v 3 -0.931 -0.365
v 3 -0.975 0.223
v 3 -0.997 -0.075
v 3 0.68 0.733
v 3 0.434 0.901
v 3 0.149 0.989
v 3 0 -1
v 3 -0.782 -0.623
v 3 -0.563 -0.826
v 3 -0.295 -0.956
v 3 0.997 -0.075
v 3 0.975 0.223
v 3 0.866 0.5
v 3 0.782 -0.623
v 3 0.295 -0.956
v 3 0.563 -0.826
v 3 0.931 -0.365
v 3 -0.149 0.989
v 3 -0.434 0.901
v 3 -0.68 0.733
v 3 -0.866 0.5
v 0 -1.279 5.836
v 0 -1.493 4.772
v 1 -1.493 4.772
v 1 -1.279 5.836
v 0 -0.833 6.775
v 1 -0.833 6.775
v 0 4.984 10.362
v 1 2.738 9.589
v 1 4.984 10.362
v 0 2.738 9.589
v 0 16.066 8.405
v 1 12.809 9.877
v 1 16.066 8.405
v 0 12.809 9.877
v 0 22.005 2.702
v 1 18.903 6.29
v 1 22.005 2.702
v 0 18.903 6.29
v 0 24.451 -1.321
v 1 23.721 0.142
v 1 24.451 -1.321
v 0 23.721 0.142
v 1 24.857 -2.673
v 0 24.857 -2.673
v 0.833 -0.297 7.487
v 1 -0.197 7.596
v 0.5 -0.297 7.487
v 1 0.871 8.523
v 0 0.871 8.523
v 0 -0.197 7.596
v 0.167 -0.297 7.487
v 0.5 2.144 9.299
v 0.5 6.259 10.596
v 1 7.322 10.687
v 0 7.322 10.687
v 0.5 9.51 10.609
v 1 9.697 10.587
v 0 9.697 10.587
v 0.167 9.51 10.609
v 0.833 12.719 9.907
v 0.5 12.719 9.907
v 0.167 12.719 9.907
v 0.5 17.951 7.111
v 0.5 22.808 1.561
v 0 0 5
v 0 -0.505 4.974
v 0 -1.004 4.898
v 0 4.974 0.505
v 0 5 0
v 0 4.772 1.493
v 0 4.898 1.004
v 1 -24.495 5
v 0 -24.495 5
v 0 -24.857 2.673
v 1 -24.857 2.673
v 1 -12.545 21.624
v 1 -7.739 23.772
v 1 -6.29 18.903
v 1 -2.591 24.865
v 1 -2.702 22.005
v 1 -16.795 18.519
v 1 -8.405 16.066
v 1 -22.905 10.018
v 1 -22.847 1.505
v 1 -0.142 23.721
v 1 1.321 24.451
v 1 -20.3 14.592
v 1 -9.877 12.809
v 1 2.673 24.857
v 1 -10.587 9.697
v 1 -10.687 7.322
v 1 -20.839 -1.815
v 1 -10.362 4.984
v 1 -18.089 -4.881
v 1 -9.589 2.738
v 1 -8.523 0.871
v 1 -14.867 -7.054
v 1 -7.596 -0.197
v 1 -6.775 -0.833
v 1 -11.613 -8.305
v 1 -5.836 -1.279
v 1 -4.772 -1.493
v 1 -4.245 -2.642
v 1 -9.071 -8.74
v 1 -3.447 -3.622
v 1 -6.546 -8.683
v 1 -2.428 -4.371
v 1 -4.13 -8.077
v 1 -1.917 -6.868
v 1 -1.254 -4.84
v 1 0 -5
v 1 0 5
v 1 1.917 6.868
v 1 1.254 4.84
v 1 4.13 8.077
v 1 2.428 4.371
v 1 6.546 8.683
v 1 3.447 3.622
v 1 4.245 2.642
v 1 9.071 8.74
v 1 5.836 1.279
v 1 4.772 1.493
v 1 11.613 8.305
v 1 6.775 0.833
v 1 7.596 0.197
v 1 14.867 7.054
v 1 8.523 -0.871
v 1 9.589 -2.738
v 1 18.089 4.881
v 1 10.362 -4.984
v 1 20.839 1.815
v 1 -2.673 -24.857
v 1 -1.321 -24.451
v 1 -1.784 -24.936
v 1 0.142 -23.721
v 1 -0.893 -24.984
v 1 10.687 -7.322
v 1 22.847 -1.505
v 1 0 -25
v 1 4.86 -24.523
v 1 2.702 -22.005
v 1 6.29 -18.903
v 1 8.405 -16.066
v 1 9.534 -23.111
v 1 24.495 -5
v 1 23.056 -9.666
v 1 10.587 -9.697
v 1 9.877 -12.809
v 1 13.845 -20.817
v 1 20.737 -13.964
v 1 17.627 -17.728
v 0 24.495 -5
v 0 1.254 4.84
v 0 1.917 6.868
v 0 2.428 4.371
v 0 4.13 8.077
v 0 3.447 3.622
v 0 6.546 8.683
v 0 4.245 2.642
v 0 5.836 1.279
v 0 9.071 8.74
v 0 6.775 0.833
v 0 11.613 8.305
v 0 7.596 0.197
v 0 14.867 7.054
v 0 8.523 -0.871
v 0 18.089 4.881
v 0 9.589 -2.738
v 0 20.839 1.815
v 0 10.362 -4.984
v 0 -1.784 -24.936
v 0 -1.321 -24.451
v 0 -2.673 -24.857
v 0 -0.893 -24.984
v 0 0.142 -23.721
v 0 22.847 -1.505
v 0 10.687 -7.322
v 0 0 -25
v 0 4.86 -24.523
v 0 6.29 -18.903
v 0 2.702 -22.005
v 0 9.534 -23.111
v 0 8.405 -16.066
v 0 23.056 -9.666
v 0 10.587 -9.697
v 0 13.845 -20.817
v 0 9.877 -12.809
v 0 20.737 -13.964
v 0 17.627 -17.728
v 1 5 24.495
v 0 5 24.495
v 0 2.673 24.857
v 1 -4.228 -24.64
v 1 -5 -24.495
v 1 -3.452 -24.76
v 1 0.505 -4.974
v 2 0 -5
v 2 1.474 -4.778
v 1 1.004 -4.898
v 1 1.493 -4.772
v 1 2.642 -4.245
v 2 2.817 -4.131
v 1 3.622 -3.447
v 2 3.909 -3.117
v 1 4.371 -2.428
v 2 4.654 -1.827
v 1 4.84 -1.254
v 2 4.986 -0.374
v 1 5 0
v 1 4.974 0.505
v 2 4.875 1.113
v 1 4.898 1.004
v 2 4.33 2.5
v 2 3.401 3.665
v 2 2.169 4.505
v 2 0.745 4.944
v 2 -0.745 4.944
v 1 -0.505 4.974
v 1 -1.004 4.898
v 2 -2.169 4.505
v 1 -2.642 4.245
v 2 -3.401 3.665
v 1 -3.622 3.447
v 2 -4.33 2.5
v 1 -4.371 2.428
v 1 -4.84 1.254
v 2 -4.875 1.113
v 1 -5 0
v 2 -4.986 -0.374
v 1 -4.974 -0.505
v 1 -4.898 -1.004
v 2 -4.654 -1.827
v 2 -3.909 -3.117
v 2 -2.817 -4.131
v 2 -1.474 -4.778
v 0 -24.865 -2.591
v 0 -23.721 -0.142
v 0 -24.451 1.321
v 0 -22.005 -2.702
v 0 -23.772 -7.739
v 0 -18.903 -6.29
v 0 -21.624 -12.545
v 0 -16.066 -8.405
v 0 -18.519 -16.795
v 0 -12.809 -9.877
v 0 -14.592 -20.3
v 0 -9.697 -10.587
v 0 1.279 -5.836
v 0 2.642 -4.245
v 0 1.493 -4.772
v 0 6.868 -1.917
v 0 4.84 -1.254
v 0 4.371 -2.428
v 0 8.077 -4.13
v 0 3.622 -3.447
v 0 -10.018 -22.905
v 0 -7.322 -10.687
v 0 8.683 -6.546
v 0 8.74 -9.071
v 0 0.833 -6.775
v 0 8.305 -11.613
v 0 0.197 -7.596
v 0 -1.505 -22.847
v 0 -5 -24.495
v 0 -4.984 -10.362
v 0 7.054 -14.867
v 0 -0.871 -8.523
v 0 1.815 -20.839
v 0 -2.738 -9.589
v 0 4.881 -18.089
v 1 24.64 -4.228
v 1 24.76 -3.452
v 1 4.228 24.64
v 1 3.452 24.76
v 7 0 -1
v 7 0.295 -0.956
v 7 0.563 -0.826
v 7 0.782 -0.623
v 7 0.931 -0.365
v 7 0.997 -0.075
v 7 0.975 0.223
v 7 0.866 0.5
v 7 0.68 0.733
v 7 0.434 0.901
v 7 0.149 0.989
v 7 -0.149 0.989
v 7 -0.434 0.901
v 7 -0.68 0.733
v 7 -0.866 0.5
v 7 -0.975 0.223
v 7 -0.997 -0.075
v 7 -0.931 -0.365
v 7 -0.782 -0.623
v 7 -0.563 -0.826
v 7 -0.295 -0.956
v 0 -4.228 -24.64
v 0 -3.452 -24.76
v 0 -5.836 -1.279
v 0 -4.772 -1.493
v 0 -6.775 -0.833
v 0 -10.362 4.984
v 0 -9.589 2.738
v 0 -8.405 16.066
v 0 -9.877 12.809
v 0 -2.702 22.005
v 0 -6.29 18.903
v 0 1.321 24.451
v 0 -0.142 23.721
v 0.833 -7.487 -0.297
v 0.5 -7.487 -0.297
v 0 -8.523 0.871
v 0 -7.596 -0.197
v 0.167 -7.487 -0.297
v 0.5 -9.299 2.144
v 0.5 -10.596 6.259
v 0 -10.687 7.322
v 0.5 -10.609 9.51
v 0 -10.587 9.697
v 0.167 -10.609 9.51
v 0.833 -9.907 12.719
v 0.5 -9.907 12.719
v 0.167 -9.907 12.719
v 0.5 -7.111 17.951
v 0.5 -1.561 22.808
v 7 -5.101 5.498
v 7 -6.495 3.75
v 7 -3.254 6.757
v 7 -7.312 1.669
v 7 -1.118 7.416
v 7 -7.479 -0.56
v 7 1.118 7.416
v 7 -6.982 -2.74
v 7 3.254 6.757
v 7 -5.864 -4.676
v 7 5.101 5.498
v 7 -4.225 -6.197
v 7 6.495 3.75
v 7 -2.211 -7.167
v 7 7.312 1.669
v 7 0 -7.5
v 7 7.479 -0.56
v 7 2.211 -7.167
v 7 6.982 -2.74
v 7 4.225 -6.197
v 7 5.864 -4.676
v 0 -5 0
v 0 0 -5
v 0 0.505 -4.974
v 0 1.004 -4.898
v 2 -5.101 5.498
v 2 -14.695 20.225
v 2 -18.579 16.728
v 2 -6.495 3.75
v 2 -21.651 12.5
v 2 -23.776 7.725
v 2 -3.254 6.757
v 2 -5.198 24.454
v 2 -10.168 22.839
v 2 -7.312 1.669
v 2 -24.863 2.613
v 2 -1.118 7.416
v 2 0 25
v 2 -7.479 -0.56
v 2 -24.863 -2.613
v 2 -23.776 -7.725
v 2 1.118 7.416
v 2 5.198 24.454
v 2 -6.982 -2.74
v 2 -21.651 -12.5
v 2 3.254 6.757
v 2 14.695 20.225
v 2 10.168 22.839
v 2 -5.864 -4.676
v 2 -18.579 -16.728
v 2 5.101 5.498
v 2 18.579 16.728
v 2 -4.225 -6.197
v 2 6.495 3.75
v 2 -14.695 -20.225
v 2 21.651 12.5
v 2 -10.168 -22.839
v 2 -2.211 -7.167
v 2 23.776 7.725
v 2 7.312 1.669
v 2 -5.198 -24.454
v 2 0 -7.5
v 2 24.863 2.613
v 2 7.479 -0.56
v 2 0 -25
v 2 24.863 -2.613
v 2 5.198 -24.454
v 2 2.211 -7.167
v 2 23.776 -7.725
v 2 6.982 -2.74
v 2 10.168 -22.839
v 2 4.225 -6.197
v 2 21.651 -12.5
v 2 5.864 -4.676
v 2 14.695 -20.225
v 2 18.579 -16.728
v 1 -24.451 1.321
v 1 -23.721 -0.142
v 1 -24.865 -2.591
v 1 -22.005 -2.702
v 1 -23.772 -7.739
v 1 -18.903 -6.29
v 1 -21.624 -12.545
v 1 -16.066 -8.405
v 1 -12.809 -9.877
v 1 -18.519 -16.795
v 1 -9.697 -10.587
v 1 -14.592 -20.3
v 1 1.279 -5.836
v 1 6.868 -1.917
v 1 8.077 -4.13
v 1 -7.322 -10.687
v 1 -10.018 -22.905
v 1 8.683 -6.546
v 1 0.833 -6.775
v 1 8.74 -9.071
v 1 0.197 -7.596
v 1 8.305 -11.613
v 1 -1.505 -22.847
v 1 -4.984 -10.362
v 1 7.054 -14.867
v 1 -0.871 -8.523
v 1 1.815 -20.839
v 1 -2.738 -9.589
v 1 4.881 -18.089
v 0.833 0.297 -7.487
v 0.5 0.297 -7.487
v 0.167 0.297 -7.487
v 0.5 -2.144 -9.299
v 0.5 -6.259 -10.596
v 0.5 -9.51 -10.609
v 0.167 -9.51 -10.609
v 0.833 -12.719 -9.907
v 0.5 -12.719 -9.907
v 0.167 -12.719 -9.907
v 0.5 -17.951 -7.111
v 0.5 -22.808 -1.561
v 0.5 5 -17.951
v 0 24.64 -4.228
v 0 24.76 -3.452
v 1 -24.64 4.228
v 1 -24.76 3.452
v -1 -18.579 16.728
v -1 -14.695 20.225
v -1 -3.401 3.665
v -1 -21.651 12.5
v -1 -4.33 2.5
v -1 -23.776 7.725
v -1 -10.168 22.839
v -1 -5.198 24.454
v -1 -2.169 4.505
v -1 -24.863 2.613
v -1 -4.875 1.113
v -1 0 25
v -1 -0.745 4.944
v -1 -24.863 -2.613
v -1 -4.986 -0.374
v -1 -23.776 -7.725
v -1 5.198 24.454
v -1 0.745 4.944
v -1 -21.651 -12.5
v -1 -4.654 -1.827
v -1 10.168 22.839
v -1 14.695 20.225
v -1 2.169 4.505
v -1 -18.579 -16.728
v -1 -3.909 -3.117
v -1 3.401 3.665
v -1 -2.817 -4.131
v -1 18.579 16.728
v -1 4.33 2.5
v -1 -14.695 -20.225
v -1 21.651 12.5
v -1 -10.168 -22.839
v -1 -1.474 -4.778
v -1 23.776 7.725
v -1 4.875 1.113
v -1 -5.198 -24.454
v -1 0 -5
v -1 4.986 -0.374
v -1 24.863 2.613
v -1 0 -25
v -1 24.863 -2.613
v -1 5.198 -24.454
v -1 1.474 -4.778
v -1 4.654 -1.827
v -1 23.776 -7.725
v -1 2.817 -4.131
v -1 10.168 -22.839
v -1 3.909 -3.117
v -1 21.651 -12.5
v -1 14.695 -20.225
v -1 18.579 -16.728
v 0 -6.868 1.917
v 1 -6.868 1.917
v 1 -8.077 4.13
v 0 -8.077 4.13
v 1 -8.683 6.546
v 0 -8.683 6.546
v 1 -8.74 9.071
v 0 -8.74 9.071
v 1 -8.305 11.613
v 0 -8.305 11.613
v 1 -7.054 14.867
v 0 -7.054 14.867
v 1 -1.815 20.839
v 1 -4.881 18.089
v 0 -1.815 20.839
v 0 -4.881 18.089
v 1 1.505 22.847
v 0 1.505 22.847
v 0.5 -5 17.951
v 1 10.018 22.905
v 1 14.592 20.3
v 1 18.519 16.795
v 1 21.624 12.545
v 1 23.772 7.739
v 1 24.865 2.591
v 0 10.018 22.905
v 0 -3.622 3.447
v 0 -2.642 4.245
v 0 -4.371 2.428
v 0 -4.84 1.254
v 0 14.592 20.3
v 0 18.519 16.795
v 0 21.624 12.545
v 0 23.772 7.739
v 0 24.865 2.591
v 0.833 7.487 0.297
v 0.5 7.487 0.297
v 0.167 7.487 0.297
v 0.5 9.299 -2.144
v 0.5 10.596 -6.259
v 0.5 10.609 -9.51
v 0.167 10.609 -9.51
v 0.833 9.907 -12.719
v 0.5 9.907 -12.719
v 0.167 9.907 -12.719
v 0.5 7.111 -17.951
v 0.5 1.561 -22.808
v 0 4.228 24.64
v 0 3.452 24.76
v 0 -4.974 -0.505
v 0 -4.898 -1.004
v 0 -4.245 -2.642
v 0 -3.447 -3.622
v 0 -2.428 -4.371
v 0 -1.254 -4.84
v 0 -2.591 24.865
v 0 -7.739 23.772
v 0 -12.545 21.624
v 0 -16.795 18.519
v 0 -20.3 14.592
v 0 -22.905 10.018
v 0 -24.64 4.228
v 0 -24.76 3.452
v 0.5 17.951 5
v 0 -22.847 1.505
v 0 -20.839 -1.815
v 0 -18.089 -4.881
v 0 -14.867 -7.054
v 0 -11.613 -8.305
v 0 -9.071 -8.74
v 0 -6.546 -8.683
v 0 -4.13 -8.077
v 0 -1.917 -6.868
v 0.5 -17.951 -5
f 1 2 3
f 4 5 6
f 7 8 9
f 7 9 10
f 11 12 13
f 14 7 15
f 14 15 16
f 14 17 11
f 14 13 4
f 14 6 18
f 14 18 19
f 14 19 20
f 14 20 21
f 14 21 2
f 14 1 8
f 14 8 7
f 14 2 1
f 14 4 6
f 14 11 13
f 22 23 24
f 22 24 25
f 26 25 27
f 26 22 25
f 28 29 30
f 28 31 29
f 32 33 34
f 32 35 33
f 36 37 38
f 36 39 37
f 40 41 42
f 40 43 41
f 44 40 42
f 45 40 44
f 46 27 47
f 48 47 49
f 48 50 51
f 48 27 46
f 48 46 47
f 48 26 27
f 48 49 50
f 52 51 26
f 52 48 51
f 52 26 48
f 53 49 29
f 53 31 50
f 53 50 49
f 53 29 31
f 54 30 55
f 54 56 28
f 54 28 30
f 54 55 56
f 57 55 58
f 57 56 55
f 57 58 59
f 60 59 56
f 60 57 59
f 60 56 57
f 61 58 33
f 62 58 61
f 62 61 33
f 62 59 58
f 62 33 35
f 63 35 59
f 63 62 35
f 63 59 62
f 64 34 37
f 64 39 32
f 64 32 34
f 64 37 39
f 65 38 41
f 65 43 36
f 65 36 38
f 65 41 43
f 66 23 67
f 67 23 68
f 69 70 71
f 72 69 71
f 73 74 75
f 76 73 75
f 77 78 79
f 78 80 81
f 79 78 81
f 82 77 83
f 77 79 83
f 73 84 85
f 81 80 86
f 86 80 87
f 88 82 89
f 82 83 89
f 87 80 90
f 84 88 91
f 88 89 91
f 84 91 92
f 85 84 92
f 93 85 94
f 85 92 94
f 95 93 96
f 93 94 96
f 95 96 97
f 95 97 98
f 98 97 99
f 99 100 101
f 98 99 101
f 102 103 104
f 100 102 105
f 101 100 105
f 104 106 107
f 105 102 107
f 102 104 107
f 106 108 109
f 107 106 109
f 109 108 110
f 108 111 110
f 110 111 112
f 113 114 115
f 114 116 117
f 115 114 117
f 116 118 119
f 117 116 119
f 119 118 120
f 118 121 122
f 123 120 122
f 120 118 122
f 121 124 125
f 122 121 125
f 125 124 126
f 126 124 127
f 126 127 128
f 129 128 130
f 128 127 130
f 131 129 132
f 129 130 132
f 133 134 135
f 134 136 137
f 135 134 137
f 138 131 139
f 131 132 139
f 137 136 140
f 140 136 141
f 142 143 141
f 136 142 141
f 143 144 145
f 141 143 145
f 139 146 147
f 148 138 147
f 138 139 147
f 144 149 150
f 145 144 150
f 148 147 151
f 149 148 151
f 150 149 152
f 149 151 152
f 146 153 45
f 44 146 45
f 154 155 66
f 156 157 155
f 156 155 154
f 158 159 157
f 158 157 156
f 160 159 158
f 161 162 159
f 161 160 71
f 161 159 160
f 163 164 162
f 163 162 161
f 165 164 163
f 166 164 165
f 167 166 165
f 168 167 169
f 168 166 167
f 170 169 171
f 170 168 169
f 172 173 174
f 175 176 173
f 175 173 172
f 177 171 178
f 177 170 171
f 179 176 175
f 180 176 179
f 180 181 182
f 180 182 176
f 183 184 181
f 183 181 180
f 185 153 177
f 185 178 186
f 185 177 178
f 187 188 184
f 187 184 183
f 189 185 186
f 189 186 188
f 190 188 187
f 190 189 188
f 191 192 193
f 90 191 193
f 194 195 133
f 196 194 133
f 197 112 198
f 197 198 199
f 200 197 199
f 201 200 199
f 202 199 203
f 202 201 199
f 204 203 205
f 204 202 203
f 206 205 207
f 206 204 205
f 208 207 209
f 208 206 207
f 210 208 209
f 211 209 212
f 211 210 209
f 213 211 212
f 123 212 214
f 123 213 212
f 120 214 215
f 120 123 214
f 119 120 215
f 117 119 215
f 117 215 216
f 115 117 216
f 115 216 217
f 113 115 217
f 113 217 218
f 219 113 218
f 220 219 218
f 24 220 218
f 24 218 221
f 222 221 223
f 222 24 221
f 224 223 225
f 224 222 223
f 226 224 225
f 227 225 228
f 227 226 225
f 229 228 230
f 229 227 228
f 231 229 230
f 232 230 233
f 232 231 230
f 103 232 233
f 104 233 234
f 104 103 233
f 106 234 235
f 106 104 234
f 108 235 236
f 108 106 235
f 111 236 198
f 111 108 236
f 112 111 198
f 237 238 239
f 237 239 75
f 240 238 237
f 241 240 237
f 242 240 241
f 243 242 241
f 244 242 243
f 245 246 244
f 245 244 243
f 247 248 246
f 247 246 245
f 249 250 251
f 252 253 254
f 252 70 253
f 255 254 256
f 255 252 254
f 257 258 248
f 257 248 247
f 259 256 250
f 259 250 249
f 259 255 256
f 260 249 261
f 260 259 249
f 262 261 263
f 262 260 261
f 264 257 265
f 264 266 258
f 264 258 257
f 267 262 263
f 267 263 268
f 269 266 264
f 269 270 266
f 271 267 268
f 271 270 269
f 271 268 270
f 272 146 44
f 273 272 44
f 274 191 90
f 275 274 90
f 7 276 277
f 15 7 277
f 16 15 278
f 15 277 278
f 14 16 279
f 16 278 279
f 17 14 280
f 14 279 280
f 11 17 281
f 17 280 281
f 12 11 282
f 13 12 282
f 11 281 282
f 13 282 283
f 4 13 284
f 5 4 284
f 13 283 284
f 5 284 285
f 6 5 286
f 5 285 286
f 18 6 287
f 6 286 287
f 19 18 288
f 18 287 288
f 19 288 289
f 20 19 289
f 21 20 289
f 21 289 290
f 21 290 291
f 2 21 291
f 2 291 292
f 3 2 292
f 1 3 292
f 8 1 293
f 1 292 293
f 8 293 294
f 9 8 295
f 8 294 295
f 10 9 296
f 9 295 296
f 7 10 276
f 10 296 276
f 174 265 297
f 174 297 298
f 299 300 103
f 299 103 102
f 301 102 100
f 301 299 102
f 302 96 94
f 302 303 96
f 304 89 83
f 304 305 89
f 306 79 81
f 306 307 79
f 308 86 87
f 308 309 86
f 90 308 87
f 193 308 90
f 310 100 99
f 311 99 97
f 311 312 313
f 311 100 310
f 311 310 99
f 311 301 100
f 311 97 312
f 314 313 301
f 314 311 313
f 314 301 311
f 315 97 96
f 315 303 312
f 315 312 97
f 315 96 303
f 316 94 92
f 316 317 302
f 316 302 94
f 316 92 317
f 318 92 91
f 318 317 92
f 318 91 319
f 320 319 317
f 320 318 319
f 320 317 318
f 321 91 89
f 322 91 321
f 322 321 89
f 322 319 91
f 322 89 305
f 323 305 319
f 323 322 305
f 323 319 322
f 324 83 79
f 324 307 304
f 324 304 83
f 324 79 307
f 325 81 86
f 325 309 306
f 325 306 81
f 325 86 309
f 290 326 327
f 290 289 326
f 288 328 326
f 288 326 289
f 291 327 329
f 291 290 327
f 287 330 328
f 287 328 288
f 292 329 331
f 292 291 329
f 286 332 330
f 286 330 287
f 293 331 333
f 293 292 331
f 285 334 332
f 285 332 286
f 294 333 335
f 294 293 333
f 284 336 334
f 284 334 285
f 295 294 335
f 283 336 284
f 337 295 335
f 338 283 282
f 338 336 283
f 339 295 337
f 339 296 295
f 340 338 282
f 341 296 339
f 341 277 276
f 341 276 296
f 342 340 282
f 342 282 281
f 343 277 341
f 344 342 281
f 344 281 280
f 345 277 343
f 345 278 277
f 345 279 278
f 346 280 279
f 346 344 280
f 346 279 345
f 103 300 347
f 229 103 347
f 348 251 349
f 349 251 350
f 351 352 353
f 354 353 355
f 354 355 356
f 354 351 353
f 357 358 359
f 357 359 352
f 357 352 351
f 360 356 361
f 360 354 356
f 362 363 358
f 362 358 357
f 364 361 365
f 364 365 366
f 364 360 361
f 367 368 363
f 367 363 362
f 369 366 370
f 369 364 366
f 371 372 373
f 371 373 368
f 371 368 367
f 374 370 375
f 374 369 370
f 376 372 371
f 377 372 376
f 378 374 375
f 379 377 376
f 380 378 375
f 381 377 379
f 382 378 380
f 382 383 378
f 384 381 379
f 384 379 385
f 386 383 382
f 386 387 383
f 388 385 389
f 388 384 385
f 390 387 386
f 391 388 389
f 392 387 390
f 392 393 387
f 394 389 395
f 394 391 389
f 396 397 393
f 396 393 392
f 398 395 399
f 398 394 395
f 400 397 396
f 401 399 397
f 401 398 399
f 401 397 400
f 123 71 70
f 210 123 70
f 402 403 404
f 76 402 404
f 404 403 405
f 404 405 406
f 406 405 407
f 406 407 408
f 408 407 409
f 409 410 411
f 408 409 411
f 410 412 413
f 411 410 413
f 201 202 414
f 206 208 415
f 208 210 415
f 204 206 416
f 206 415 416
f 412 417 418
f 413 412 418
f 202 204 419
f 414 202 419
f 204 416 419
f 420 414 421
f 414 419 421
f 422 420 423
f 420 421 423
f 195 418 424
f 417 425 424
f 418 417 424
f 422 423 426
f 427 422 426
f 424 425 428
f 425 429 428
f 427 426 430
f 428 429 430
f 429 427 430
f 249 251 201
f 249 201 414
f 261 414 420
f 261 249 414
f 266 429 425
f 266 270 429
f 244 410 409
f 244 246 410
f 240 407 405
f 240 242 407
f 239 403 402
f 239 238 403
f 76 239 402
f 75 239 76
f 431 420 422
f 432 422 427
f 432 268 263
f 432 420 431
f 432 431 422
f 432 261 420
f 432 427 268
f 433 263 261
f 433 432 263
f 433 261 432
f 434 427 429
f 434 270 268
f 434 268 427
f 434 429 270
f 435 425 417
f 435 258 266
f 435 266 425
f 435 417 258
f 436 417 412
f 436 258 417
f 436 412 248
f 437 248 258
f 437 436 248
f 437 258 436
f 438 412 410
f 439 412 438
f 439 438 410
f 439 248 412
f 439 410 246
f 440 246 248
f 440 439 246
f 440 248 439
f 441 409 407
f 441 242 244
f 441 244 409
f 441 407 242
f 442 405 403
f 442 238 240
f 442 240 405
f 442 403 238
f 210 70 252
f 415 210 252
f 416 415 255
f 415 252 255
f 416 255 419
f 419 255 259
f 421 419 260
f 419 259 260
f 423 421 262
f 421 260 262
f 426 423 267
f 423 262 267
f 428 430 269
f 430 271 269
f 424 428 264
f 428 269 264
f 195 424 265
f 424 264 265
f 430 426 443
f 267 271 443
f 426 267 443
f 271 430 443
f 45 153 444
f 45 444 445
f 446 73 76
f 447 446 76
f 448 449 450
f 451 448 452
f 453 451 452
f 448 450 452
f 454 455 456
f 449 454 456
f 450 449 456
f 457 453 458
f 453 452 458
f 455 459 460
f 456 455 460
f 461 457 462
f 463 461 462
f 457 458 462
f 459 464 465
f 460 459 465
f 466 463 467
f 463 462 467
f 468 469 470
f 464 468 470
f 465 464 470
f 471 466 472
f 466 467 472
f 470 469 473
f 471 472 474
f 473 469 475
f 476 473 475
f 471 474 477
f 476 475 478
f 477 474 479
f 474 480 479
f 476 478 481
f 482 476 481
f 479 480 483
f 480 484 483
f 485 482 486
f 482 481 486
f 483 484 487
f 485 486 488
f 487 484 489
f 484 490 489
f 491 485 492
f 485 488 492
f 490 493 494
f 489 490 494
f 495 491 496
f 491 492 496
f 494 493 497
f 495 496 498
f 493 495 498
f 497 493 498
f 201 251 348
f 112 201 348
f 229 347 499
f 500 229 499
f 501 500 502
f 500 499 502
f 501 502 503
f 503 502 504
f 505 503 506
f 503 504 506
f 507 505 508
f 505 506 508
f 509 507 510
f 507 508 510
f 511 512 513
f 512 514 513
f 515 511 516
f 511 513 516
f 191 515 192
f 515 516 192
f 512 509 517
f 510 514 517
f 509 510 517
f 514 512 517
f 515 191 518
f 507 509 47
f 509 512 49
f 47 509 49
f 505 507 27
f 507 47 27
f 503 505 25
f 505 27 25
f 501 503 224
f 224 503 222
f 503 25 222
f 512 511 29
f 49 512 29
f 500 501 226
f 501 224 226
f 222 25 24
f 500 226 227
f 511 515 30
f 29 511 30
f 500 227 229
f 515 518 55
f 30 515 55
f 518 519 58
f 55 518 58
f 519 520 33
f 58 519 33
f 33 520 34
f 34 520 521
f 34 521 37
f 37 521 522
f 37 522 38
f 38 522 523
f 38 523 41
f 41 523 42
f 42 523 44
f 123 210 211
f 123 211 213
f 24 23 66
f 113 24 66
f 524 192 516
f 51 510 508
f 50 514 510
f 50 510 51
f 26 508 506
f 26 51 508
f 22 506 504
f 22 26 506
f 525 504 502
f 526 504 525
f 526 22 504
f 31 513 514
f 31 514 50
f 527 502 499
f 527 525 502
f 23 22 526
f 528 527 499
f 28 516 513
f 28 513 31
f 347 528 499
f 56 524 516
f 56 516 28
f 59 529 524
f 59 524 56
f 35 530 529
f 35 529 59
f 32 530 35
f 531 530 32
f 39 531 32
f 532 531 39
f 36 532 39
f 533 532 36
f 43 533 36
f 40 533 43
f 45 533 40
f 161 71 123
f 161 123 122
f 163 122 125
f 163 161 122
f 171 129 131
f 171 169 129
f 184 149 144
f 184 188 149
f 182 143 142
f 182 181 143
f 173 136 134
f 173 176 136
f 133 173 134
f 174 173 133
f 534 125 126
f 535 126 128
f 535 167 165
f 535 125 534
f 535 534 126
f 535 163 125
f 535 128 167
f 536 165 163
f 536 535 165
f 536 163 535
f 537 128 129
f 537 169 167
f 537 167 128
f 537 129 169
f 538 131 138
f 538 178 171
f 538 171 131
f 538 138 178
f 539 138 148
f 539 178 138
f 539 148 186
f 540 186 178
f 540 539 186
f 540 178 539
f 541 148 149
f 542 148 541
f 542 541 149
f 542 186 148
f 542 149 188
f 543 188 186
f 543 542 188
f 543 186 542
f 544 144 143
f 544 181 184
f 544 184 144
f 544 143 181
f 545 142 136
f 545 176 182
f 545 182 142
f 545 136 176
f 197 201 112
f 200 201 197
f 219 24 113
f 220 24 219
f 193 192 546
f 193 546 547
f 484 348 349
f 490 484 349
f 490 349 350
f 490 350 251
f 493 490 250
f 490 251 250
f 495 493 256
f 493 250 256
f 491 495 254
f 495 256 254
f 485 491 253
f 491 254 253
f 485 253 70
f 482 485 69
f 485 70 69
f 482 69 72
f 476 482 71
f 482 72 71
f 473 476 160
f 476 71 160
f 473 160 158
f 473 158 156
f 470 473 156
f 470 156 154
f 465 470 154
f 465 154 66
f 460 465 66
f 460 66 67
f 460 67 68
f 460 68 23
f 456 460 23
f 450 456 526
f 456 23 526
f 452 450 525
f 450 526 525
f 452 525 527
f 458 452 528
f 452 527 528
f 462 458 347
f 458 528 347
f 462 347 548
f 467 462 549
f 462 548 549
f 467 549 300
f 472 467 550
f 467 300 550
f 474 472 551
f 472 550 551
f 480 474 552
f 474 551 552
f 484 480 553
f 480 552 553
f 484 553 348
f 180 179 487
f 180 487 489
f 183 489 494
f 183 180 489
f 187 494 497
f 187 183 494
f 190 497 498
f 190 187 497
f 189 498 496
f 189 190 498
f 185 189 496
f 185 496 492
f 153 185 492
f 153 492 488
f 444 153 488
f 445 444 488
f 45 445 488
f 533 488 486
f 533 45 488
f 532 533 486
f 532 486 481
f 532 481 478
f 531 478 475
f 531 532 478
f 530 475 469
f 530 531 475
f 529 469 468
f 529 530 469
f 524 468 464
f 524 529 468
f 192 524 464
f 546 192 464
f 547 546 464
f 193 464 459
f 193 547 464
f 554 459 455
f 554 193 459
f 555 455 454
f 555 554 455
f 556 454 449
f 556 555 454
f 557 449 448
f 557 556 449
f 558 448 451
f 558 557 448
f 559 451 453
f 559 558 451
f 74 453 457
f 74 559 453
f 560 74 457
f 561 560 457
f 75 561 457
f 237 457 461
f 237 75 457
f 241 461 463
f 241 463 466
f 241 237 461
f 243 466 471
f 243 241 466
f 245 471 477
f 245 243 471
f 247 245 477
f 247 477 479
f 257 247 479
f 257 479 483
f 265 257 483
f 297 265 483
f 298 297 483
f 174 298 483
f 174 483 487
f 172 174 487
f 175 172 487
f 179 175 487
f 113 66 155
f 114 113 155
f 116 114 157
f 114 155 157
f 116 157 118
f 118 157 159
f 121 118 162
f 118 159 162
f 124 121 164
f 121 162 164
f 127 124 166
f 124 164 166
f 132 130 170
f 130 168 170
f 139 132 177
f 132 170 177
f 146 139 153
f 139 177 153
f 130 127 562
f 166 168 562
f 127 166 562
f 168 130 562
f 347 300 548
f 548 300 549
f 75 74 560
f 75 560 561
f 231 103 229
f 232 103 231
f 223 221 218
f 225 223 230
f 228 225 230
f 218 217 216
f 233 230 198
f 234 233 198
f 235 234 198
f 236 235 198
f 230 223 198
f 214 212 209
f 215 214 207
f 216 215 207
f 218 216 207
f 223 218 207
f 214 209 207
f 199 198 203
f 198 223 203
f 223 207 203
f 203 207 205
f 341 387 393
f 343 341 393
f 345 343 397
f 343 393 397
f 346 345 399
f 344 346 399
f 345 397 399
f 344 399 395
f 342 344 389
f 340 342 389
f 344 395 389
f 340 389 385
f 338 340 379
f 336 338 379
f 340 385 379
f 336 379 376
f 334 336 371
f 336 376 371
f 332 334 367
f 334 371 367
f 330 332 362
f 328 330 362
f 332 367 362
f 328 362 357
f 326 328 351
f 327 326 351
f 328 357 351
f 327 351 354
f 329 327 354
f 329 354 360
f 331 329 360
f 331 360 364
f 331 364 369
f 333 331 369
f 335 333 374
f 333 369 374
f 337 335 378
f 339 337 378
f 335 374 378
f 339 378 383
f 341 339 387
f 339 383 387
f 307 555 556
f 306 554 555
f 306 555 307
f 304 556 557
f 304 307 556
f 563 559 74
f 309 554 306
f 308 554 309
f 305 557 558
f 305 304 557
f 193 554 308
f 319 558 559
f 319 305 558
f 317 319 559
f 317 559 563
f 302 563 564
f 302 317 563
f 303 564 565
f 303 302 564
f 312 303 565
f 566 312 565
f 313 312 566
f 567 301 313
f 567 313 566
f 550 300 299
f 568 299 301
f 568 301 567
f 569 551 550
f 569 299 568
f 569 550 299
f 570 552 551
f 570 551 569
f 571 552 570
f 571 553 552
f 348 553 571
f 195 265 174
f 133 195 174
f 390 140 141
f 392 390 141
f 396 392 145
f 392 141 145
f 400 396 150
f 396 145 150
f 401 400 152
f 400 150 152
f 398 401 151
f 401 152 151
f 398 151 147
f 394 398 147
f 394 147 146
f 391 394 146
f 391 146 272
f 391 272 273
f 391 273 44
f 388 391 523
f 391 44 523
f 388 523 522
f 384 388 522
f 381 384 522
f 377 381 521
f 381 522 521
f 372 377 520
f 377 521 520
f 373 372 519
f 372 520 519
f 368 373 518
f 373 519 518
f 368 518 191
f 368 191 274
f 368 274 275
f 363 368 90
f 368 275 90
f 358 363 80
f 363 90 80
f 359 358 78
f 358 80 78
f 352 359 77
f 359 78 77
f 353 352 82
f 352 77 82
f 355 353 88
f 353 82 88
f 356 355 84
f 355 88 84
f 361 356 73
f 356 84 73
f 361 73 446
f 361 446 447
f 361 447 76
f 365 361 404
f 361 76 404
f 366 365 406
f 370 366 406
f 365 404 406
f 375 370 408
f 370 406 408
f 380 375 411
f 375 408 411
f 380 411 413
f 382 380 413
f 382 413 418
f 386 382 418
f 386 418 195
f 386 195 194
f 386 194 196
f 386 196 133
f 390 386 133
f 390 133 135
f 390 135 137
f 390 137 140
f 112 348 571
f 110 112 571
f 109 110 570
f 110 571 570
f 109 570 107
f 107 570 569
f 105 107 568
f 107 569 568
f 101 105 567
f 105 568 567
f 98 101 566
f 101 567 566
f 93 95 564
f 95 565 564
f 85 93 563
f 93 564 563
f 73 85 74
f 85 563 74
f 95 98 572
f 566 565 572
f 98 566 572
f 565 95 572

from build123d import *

# Parameters (mm, degrees)
BOSS_EXTRUDE1_DEPTH   = 1
BOSS_EXTRUDE1_2_DEPTH = 1
BOSS_EXTRUDE1_3_DEPTH = 1
BOSS_EXTRUDE1_4_DEPTH = 1
SKETCH2_R             = 25
SKETCH2_R_2           = 5
BOSS_EXTRUDE2_DEPTH   = 1
BOSS_EXTRUDE6_START   = -1
SKETCH2_4_R           = 25
SKETCH2_4_R_2         = 5
BOSS_EXTRUDE6_DEPTH   = 1
SKETCH3_R             = 7.5
BOSS_EXTRUDE7_DEPTH   = 5
SKETCH4_R             = 1
CUT_EXTRUDE1_DEPTH    = 4


with BuildPart() as part:
    # Sketch1 → Boss-Extrude1 (new body)
    with BuildSketch(Plane(origin=(0, 0, 0), x_dir=(0, 0, -1), z_dir=(1, 0, 0))):
        with BuildLine():
            add(Edge.make_bspline(
                [(0, 5), (4.497529661, 10.734535644), (18.077265621, 8.404390401), (22.903151971, -1.371454076), (24.494897428, -5)],
                knots=[0, 0, 0, 0, 0.618777628, 1, 1, 1, 1], degree=3))
            add(Edge.make_bspline(
                [(24.494897428, -5), (24.856687291, -2.673031407)],
                knots=[0, 0, 1, 1], degree=1))
            add(Edge.make_bspline(
                [(-1.492986361, 4.77189603), (-1.334435901, 6.923416971), (1.516351493, 9.375782971), (6.922460383, 11.063211687), (12.668210337, 10.322852941), (18.630485351, 7.165584221), (22.391904574, 2.350944019), (24.550618301, -1.104983558), (24.856687291, -2.673031407)],
                knots=[0, 0, 0, 0, 0.172506063, 0.296264897, 0.482616547, 0.652804407, 0.864378799, 1, 1, 1, 1], degree=3))
            add(Edge.make_bspline(
                [(-1.492986361, 4.77189603), (0, 5)],
                knots=[0, 0, 1, 1], degree=1))
        make_face()
    extrude(amount=BOSS_EXTRUDE1_DEPTH)



with BuildPart() as body_2:
    # Sketch1 → Boss-Extrude1 2 (new body)
    with BuildSketch(Plane(origin=(0, 0, 0), x_dir=(0, 0, -1), z_dir=(1, 0, 0))):
        with BuildLine():
            add(Edge.make_bspline(
                [(4.77189603, 1.492986361), (6.923416971, 1.334435901), (9.375782971, -1.516351493), (11.063211687, -6.922460383), (10.322852941, -12.668210337), (7.165584221, -18.630485351), (2.350944019, -22.391904574), (-1.104983558, -24.550618301), (-2.673031407, -24.856687291)],
                knots=[0, 0, 0, 0, 0.172506063, 0.296264897, 0.482616547, 0.652804407, 0.864378799, 1, 1, 1, 1], degree=3))
            add(Edge.make_bspline(
                [(-5, -24.494897428), (-2.673031407, -24.856687291)],
                knots=[0, 0, 1, 1], degree=1))
            add(Edge.make_bspline(
                [(5, 0), (10.734535644, -4.497529661), (8.404390401, -18.077265621), (-1.371454076, -22.903151971), (-5, -24.494897428)],
                knots=[0, 0, 0, 0, 0.618777628, 1, 1, 1, 1], degree=3))
            add(Edge.make_bspline(
                [(4.77189603, 1.492986361), (5, 0)],
                knots=[0, 0, 1, 1], degree=1))
        make_face()
    extrude(amount=BOSS_EXTRUDE1_2_DEPTH)


with BuildPart() as body_3:
    # Sketch1 → Boss-Extrude1 3 (new body)
    with BuildSketch(Plane(origin=(0, 0, 0), x_dir=(0, 0, -1), z_dir=(1, 0, 0))):
        with BuildLine():
            add(Edge.make_bspline(
                [(1.492986361, -4.77189603), (1.334435901, -6.923416971), (-1.516351493, -9.375782971), (-6.922460383, -11.063211687), (-12.668210337, -10.322852941), (-18.630485351, -7.165584221), (-22.391904574, -2.350944019), (-24.550618301, 1.104983558), (-24.856687291, 2.673031407)],
                knots=[0, 0, 0, 0, 0.172506063, 0.296264897, 0.482616547, 0.652804407, 0.864378799, 1, 1, 1, 1], degree=3))
            add(Edge.make_bspline(
                [(-24.494897428, 5), (-24.856687291, 2.673031407)],
                knots=[0, 0, 1, 1], degree=1))
            add(Edge.make_bspline(
                [(0, -5), (-4.497529661, -10.734535644), (-18.077265621, -8.404390401), (-22.903151971, 1.371454076), (-24.494897428, 5)],
                knots=[0, 0, 0, 0, 0.618777628, 1, 1, 1, 1], degree=3))
            add(Edge.make_bspline(
                [(1.492986361, -4.77189603), (0, -5)],
                knots=[0, 0, 1, 1], degree=1))
        make_face()
    extrude(amount=BOSS_EXTRUDE1_3_DEPTH)


with BuildPart() as body_4:
    # Sketch1 → Boss-Extrude1 4 (new body)
    with BuildSketch(Plane(origin=(0, 0, 0), x_dir=(0, 0, -1), z_dir=(1, 0, 0))):
        with BuildLine():
            add(Edge.make_bspline(
                [(-4.77189603, -1.492986361), (-6.923416971, -1.334435901), (-9.375782971, 1.516351493), (-11.063211687, 6.922460383), (-10.322852941, 12.668210337), (-7.165584221, 18.630485351), (-2.350944019, 22.391904574), (1.104983558, 24.550618301), (2.673031407, 24.856687291)],
                knots=[0, 0, 0, 0, 0.172506063, 0.296264897, 0.482616547, 0.652804407, 0.864378799, 1, 1, 1, 1], degree=3))
            add(Edge.make_bspline(
                [(5, 24.494897428), (2.673031407, 24.856687291)],
                knots=[0, 0, 1, 1], degree=1))
            add(Edge.make_bspline(
                [(-5, 0), (-10.734535644, 4.497529661), (-8.404390401, 18.077265621), (1.371454076, 22.903151971), (5, 24.494897428)],
                knots=[0, 0, 0, 0, 0.618777628, 1, 1, 1, 1], degree=3))
            add(Edge.make_bspline(
                [(-4.77189603, -1.492986361), (-5, 0)],
                knots=[0, 0, 1, 1], degree=1))
        make_face()
    extrude(amount=BOSS_EXTRUDE1_4_DEPTH)


with BuildPart() as part_1:
    add(part.part)

    add(body_2.part)  # Boss-Extrude2 merges body 2

    add(body_3.part)  # Boss-Extrude2 merges body 3

    add(body_4.part)  # Boss-Extrude2 merges body 4
    # Sketch2 → Boss-Extrude2 (add)
    with BuildSketch(Plane(origin=(1, 0, 0), x_dir=(0, 0, -1), z_dir=(1, 0, 0))):
        Circle(SKETCH2_R)
        Circle(SKETCH2_R_2, mode=Mode.SUBTRACT)
    extrude(amount=BOSS_EXTRUDE2_DEPTH)

    # Sketch2<4> → Boss-Extrude6 (add)
    with BuildSketch(Plane(origin=(1, 0, 0), x_dir=(0, 0, -1), z_dir=(1, 0, 0)).offset(BOSS_EXTRUDE6_START)):
        Circle(SKETCH2_4_R)
        Circle(SKETCH2_4_R_2, mode=Mode.SUBTRACT)
    extrude(amount=-BOSS_EXTRUDE6_DEPTH)

    # Sketch3 → Boss-Extrude7 (add)
    with BuildSketch(Plane(origin=(2, 0, 0), x_dir=(0, 0, -1), z_dir=(1, 0, 0))):
        Circle(SKETCH3_R)
    extrude(amount=BOSS_EXTRUDE7_DEPTH)

    # Sketch4 → Cut-Extrude1 (cut)
    with BuildSketch(Plane(origin=(7, 0, 0), x_dir=(0, 0, -1), z_dir=(1, 0, 0))):
        Circle(SKETCH4_R)
    extrude(amount=-CUT_EXTRUDE1_DEPTH, mode=Mode.SUBTRACT)


solid = part_1.part
